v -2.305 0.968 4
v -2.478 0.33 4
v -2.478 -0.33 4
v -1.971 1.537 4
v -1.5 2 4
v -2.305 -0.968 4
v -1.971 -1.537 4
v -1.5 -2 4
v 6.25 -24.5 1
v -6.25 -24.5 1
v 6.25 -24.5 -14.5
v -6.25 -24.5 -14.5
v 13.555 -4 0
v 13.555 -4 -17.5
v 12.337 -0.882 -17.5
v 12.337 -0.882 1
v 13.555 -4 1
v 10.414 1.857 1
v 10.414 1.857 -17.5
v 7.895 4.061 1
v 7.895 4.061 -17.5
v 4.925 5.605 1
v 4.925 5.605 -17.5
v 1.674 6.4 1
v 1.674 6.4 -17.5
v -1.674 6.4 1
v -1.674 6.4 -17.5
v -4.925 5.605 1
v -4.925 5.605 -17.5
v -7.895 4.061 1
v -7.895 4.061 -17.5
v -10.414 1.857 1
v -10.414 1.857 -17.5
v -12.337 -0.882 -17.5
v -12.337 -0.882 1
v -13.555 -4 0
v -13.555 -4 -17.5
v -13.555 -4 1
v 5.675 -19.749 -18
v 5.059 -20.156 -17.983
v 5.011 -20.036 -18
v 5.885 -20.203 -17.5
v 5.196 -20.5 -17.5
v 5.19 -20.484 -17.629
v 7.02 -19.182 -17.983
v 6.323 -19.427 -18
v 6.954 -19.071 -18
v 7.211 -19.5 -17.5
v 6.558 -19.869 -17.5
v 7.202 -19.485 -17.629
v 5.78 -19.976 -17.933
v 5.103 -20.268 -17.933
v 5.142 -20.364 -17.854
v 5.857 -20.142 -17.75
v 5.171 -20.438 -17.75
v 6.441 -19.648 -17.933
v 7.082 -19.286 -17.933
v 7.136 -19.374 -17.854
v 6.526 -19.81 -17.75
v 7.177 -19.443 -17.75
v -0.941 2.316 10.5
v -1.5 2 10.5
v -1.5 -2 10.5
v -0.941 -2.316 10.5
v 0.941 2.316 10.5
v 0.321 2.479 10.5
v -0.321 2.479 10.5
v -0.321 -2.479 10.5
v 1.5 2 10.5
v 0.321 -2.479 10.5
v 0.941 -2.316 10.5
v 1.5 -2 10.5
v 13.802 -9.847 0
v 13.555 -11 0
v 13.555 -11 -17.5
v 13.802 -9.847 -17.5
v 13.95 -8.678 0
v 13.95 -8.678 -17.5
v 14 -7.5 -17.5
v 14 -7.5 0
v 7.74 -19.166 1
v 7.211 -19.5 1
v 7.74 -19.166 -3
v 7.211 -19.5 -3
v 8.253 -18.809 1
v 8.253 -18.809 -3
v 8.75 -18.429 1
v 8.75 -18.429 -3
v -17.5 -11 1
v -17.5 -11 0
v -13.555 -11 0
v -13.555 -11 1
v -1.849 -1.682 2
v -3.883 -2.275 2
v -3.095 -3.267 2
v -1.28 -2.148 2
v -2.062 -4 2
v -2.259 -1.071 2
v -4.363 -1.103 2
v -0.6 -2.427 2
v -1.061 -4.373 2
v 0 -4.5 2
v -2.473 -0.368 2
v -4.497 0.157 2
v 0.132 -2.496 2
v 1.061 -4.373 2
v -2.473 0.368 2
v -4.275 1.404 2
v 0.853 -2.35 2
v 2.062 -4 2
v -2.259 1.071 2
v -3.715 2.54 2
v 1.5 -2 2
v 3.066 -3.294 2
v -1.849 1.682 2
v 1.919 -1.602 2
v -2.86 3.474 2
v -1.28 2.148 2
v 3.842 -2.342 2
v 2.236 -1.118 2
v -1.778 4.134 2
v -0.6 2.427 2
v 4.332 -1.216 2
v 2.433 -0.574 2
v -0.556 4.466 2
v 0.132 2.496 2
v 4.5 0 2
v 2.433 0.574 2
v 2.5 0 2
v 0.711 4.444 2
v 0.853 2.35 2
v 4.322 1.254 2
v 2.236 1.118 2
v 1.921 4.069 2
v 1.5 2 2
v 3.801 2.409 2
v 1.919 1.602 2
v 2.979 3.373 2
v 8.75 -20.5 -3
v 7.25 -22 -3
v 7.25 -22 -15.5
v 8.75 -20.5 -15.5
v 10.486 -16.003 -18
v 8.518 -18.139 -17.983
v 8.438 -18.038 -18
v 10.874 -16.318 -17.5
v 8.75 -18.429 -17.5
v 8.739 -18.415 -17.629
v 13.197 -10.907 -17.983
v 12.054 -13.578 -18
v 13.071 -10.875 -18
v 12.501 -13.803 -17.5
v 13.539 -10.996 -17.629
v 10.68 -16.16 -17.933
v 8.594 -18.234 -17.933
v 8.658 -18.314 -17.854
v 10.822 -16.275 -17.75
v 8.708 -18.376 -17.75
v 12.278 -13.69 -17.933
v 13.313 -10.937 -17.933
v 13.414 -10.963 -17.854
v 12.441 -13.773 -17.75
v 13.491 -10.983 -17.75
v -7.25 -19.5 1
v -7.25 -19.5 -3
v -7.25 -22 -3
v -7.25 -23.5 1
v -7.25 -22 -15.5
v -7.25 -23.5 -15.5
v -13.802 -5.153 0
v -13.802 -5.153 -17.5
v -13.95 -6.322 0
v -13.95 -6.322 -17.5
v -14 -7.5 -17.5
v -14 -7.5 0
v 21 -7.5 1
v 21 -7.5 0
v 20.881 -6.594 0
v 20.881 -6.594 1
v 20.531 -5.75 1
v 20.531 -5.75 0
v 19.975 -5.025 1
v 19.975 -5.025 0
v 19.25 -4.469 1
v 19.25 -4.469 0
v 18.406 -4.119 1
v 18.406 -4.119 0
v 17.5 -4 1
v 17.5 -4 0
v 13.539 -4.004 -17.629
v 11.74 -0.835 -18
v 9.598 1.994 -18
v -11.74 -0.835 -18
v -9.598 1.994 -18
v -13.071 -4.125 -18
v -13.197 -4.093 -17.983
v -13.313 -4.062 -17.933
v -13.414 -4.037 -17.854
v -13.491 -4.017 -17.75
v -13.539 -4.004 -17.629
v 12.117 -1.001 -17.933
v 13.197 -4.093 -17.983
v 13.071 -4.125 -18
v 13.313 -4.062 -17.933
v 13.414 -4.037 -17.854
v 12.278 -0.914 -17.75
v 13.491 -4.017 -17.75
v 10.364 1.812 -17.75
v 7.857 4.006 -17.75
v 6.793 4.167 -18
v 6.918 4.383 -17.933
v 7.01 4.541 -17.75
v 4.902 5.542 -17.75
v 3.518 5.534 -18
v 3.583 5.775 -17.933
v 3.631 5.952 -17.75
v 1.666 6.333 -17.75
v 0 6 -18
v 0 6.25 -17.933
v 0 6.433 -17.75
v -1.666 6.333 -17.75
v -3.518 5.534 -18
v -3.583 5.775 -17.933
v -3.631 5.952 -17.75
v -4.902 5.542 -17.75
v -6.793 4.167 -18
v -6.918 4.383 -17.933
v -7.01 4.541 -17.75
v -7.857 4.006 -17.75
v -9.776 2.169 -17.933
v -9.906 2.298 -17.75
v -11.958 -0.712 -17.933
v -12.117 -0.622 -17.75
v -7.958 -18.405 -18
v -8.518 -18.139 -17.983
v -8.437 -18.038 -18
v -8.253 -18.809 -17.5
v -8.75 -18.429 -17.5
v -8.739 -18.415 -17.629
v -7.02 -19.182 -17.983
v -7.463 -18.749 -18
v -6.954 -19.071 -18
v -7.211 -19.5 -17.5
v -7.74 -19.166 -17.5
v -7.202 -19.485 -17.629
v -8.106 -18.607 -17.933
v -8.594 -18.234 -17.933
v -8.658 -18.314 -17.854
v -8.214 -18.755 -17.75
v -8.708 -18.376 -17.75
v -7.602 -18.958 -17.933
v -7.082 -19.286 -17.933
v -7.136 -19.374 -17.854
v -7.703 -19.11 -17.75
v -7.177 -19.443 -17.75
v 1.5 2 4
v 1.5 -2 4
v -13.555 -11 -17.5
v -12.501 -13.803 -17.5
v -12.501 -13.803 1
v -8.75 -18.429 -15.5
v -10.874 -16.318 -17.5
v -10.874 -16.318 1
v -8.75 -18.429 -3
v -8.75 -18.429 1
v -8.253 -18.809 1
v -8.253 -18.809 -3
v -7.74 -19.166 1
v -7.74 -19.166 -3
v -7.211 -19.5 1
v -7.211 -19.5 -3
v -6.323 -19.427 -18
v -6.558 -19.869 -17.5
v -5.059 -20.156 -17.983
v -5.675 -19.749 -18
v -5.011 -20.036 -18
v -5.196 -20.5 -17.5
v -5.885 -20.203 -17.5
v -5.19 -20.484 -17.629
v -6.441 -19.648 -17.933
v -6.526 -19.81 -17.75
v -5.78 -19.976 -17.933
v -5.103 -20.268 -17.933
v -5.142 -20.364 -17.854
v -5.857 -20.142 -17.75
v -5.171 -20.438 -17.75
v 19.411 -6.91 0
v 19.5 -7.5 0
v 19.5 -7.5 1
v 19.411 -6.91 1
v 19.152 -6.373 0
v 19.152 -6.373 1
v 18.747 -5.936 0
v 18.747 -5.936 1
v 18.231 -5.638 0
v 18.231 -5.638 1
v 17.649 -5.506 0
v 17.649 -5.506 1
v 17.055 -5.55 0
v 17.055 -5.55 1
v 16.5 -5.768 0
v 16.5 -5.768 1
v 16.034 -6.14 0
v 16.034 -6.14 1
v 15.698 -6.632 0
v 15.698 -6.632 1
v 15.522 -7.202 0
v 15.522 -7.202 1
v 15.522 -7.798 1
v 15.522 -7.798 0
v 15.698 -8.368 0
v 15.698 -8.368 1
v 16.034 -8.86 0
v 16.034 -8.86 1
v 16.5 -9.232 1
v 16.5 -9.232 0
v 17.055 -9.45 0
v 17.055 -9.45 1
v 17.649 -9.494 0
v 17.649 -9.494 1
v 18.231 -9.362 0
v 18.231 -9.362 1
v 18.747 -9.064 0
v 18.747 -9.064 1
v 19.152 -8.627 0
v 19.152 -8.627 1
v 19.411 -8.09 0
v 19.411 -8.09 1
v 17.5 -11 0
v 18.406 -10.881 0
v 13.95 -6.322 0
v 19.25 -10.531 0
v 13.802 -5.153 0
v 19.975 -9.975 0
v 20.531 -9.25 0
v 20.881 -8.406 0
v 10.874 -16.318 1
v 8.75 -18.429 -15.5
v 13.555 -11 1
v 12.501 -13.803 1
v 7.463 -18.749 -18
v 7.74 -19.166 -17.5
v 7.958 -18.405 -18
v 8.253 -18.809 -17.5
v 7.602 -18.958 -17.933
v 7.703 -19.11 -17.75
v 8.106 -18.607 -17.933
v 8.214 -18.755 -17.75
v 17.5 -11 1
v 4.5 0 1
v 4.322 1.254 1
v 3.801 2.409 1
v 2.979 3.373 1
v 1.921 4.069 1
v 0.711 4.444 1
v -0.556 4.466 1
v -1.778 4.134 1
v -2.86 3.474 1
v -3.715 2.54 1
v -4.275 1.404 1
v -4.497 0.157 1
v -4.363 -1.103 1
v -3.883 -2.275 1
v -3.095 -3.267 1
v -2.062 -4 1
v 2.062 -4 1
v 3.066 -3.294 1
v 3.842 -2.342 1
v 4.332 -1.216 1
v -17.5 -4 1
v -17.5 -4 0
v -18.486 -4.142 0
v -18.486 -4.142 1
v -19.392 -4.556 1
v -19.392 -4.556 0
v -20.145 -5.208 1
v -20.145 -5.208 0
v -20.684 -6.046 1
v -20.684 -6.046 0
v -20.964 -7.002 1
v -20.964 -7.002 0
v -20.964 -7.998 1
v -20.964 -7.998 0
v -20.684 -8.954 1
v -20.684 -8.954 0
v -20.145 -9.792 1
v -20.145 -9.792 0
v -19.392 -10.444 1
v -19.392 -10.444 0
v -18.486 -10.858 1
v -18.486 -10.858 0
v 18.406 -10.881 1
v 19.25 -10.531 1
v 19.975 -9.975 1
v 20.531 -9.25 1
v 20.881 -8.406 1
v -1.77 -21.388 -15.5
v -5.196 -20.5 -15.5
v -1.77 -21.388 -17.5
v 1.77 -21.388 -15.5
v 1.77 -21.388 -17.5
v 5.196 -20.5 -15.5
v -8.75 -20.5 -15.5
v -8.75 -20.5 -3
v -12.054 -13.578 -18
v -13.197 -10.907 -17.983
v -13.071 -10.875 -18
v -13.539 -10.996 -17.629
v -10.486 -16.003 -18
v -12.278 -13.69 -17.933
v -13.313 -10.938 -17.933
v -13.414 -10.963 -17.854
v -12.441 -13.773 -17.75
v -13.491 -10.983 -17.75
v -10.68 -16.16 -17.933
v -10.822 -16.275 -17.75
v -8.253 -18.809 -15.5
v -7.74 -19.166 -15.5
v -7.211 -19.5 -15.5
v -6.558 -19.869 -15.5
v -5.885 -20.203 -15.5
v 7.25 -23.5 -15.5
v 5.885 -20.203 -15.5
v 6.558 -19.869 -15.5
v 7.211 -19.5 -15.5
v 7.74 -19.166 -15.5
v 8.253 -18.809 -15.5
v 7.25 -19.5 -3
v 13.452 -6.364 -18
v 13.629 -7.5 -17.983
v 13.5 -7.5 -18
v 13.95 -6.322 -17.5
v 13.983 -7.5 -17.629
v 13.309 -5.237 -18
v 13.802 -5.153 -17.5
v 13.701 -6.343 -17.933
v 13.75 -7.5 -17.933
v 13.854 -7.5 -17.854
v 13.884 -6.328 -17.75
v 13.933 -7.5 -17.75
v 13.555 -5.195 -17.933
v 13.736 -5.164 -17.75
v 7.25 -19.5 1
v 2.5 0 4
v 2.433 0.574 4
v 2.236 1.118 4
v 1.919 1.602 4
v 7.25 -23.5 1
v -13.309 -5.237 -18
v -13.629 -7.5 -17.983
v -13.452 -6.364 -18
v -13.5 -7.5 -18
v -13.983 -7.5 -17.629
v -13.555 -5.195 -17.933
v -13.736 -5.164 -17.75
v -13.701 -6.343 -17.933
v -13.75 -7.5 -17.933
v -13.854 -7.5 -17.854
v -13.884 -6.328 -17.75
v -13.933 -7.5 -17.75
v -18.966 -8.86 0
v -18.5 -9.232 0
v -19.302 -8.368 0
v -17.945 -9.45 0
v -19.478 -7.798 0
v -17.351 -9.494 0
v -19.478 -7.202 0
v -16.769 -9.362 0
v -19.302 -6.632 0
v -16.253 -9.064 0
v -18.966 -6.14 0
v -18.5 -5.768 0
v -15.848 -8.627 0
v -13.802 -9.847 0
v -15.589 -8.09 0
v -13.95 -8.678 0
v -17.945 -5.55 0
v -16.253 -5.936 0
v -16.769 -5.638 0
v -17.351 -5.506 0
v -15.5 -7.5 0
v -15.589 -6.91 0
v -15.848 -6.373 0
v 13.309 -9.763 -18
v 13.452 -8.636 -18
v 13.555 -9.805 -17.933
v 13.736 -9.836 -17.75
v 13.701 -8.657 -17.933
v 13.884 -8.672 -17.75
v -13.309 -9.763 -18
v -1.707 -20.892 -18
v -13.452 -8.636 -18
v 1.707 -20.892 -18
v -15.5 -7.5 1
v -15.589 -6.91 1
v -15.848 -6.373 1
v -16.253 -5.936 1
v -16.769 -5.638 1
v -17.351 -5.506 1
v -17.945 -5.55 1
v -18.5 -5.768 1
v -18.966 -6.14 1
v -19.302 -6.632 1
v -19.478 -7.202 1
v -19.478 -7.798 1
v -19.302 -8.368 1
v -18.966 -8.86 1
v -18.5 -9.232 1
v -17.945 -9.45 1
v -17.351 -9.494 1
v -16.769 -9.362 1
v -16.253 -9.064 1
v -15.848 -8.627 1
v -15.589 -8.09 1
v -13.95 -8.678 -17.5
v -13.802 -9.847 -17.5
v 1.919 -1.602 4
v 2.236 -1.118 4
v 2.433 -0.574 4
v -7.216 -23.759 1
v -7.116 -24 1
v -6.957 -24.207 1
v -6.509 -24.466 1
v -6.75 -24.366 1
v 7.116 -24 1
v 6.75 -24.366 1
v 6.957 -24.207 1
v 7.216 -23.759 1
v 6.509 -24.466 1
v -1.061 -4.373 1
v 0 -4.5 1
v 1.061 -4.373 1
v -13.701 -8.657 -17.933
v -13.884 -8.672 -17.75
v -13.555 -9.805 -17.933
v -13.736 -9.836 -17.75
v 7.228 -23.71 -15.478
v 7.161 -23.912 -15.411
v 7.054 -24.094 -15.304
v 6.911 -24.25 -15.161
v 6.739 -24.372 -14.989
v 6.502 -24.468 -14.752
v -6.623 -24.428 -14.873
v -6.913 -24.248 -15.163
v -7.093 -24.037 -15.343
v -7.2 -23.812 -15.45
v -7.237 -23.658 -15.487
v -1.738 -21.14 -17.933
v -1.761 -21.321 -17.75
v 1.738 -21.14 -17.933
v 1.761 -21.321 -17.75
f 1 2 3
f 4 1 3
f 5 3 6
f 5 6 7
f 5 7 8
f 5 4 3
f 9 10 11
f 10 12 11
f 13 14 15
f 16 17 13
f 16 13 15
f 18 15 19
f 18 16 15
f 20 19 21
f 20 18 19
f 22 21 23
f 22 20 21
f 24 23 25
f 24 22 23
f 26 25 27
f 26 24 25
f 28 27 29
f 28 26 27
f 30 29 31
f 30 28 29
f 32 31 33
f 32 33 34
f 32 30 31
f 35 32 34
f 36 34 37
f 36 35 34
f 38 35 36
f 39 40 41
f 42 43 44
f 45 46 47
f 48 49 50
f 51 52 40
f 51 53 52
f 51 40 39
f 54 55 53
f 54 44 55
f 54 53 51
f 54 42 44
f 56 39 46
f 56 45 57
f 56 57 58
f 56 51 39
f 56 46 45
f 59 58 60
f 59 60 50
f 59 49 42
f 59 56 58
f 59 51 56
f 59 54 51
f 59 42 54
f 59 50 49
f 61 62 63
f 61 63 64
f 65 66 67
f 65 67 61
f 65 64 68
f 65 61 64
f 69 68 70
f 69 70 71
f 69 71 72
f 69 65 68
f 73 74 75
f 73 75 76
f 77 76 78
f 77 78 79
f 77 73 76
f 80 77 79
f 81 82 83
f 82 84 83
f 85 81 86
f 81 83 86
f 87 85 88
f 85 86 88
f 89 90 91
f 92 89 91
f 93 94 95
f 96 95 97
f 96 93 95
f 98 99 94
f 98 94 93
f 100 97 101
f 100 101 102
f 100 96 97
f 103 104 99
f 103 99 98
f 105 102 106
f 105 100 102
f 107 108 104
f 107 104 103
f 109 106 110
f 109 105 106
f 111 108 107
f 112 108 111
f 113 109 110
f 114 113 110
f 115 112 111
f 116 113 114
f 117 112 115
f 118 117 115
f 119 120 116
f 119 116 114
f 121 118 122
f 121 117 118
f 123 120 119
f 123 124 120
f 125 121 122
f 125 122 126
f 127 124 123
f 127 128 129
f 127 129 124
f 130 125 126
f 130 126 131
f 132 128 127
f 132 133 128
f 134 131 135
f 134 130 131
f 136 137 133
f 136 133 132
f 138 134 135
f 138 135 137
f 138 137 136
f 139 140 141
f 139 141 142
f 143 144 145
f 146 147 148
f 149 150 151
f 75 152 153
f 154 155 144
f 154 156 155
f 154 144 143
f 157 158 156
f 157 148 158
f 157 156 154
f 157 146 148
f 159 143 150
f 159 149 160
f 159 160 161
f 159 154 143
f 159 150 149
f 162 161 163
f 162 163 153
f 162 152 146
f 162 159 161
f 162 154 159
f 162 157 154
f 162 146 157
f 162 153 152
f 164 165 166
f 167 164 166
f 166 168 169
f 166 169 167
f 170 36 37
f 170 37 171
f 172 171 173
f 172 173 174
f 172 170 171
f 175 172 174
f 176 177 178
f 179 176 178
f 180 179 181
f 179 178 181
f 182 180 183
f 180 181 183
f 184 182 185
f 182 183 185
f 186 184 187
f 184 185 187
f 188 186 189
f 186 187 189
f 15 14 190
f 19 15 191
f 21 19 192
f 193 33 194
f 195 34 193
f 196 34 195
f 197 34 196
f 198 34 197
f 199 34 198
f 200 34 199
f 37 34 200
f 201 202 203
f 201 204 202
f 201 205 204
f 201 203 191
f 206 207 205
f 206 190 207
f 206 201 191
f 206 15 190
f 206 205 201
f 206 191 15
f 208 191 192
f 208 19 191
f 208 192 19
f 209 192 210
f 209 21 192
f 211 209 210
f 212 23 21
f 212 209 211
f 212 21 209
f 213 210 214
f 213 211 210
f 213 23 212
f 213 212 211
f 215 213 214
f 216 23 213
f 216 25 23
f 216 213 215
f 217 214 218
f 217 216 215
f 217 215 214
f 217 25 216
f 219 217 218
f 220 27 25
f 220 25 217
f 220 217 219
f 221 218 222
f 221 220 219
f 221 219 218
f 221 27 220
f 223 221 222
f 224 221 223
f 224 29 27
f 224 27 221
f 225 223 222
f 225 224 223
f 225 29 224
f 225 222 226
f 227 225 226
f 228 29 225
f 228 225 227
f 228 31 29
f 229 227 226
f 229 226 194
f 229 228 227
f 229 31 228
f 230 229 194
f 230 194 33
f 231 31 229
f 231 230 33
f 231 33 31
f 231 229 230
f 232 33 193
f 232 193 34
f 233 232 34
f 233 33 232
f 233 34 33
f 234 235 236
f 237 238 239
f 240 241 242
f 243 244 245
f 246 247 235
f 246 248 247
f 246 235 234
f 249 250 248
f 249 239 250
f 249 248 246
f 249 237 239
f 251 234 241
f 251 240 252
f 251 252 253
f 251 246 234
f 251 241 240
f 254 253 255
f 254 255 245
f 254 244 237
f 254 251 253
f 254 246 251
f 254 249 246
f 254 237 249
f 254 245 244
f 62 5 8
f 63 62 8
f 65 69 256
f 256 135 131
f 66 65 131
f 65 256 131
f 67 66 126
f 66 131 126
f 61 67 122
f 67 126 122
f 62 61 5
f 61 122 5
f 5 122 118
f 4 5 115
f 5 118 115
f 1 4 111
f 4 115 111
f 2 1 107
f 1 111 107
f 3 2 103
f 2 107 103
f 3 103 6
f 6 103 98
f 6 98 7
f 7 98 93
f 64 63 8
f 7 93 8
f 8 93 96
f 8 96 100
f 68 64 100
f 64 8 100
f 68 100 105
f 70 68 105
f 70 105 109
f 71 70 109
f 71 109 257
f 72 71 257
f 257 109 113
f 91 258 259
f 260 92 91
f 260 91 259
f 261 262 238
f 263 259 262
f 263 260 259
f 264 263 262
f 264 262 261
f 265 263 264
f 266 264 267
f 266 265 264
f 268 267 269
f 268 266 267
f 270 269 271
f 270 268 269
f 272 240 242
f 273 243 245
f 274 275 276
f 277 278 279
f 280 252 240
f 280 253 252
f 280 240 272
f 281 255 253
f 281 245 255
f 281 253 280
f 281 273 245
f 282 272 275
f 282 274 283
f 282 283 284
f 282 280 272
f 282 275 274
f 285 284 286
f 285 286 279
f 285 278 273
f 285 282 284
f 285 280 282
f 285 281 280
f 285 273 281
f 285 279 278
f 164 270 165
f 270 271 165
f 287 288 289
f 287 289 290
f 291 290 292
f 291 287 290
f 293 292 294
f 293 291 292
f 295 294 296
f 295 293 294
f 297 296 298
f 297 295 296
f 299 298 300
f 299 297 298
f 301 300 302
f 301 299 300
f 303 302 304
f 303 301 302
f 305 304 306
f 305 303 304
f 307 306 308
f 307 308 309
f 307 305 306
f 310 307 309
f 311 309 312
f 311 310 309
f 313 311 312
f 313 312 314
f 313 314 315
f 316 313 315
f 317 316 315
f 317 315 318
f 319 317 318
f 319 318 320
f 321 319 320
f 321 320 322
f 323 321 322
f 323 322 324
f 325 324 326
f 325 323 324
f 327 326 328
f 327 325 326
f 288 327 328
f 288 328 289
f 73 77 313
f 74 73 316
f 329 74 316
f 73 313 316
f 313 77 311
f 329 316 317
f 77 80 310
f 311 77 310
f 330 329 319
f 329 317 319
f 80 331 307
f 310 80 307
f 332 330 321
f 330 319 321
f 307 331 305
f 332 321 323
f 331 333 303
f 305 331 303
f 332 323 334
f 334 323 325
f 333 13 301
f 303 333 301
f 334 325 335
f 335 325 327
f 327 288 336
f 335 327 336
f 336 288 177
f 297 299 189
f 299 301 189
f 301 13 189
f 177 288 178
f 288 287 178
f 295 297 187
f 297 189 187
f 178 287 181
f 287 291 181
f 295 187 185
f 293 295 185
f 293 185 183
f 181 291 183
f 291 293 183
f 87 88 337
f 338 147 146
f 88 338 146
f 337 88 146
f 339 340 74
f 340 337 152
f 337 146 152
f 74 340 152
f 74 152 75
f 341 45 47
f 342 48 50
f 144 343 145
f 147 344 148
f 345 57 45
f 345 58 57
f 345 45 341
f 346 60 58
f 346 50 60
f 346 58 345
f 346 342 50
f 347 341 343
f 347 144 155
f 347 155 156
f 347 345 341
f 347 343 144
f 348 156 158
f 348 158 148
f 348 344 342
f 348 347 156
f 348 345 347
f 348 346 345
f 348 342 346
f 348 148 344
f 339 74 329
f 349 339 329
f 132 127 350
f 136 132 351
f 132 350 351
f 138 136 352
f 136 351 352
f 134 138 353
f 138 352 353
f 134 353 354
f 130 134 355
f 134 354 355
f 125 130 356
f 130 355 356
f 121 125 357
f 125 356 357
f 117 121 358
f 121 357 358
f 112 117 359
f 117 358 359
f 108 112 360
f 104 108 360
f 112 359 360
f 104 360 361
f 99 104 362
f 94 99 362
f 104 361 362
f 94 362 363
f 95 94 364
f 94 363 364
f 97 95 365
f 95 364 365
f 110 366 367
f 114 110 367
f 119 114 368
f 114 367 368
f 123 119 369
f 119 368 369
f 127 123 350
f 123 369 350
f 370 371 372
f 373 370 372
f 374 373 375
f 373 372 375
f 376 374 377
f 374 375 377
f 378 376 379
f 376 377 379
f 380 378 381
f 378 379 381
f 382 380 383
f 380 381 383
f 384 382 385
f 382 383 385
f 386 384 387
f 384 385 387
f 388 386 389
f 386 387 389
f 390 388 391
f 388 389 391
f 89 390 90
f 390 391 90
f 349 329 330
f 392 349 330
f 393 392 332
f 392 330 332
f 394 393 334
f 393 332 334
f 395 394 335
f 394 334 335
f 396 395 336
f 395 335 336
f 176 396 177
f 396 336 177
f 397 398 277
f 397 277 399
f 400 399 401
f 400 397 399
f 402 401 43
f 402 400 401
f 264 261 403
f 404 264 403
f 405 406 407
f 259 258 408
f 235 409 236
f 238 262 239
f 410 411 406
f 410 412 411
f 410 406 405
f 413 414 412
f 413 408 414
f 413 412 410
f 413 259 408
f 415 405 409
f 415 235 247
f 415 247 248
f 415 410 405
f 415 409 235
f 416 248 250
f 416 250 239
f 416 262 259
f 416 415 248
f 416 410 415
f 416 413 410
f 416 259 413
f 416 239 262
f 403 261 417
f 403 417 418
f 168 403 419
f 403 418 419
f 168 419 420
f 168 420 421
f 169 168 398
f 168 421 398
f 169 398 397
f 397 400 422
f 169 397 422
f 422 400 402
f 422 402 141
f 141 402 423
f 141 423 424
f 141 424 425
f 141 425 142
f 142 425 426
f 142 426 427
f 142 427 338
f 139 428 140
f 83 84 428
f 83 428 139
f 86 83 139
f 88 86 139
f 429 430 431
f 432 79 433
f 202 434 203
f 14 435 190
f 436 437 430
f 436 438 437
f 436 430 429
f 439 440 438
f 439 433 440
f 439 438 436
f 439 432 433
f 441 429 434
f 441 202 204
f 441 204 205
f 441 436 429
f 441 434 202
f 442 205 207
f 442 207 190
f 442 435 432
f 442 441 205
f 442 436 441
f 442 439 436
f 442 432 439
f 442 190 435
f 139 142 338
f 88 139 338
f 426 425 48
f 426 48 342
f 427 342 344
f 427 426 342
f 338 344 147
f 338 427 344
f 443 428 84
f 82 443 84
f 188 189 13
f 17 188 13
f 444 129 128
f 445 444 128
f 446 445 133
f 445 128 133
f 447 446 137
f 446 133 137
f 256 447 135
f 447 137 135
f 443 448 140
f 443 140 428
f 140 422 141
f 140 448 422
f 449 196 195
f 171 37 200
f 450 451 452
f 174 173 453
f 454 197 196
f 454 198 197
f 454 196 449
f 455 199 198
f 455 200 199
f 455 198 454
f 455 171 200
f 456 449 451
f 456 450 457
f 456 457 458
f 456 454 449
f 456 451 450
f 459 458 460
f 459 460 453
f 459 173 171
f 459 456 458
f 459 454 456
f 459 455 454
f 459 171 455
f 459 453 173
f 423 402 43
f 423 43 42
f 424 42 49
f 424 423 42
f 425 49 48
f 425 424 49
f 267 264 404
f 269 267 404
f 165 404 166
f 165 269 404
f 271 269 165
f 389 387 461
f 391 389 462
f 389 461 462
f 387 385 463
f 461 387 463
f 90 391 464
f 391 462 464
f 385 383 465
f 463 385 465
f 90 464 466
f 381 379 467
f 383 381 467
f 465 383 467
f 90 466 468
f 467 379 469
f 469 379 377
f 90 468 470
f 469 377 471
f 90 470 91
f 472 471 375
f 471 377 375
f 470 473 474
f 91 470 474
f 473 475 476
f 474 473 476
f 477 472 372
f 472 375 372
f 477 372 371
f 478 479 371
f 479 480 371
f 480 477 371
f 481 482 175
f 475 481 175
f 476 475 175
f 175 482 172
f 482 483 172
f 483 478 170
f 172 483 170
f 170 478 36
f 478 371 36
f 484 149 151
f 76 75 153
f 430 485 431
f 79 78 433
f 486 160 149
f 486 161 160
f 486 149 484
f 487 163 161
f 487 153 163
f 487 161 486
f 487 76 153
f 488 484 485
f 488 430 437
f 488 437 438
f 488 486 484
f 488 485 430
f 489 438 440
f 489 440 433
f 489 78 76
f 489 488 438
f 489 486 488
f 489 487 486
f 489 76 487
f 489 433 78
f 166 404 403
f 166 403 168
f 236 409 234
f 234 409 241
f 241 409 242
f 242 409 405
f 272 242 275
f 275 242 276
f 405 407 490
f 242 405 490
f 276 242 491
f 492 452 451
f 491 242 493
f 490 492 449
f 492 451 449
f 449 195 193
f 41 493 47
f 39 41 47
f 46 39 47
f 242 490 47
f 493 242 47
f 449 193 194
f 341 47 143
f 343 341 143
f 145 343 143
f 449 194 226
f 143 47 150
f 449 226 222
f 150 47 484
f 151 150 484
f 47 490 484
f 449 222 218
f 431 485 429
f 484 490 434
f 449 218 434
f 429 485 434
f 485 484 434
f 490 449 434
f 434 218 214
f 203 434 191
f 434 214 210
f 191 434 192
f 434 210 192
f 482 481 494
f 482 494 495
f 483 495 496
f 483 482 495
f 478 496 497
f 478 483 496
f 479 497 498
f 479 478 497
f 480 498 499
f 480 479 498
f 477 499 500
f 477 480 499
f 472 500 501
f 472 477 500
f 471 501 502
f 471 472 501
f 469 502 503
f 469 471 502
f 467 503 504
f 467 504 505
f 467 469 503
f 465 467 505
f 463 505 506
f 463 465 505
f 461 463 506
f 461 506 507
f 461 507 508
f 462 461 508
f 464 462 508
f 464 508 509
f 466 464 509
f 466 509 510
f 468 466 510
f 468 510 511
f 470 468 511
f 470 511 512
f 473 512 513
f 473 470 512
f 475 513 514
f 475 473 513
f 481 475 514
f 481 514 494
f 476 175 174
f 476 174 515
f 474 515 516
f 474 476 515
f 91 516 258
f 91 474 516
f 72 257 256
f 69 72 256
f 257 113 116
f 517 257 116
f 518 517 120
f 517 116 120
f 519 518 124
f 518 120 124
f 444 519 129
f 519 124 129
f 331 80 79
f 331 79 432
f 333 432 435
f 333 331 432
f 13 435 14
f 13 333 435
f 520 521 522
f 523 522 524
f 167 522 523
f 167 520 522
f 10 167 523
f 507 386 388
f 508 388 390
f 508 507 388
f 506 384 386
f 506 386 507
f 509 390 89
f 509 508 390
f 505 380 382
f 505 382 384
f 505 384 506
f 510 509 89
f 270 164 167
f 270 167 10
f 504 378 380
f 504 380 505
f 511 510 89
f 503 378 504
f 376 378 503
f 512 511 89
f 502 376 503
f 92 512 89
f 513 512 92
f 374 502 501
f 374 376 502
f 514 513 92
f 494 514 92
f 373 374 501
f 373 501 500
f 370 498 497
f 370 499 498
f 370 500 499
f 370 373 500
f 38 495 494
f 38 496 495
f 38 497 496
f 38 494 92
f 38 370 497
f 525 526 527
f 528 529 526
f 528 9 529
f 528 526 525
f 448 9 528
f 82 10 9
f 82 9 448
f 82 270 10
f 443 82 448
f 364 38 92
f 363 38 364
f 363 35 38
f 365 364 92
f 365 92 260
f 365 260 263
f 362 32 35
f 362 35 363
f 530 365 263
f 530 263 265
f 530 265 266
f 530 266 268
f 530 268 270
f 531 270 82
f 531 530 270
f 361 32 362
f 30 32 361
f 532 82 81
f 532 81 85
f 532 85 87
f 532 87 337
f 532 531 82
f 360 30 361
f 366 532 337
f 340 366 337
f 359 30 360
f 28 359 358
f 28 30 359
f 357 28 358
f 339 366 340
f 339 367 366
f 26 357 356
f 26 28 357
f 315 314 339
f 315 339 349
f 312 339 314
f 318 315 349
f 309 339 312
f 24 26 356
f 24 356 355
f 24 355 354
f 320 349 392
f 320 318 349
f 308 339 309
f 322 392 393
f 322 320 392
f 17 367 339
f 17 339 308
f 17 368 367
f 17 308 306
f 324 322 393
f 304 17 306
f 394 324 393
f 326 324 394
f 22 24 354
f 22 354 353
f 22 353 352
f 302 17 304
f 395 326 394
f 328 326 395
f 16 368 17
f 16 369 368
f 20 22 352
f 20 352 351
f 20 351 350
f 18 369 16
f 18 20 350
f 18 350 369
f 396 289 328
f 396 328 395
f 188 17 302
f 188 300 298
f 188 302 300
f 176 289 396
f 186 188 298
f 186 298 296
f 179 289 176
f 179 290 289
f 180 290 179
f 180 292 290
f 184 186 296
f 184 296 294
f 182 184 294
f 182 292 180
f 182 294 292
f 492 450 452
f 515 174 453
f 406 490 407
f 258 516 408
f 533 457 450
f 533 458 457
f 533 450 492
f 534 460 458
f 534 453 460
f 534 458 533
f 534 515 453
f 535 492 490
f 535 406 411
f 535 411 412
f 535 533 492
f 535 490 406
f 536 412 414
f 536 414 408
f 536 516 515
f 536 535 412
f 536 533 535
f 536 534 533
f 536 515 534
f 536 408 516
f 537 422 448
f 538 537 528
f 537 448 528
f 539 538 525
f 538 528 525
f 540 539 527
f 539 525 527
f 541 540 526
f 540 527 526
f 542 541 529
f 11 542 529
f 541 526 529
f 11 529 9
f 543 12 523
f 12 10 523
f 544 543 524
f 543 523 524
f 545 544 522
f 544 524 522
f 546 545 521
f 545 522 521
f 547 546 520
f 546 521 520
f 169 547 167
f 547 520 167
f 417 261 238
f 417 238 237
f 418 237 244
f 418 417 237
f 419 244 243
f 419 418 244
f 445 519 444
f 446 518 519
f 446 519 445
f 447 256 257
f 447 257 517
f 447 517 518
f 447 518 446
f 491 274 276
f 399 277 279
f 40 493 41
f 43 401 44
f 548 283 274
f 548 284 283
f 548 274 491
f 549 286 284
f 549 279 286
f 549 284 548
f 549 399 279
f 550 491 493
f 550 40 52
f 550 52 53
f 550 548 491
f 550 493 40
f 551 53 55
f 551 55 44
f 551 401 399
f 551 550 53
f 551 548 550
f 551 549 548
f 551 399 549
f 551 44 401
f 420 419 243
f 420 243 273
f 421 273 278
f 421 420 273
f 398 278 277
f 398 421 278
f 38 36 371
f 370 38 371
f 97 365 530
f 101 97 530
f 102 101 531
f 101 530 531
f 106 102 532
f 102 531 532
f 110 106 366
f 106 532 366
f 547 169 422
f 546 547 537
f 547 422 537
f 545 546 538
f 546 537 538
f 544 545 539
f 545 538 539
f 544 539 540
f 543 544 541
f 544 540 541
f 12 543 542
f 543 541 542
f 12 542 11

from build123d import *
from build123d import SkipClean  # not in build123d's __all__

# Parameters (mm, degrees)
F0_R          = 2
F1_DEPTH      = 1
F2_DEPTH      = 18
F3_DEPTH      = 15.5
F3_DEPTH_BACK = 1
F4_START      = -3
F4_DEPTH      = 12.5
F5_DEPTH      = 2
F6_DEPTH      = 4
F7_DEPTH      = 10.5
F8_R          = 0.5
F9_R          = 1


with BuildPart() as f1:
    # F0 (on Top) → F1 (new body)
    with BuildSketch(Plane.XY):
        with BuildLine():
            ThreePointArc((2.0615528128, -4), (0, -4.5), (-2.0615528128, -4))
            Line((-2.0615528128, -4), (-13.5554417117, -4))
            ThreePointArc((-13.5554417117, -4), (-13.8884157477, -5.7359399052), (-14, -7.5))
            ThreePointArc((-14, -7.5), (-13.8884157477, -9.2640600948), (-13.5554417117, -11))
            Line((-13.5554417117, -11), (13.5554417117, -11))
            ThreePointArc((13.5554417117, -11), (13.8884157477, -9.2640600948), (14, -7.5))
            ThreePointArc((14, -7.5), (13.8884157477, -5.7359399052), (13.5554417117, -4))
            Line((13.5554417117, -4), (2.0615528128, -4))
        make_face()
        with BuildLine():
            ThreePointArc((17.5, -4), (15.0251262658, -5.0251262658), (14, -7.5))
            ThreePointArc((14, -7.5), (15.0251262658, -9.9748737342), (17.5, -11))
            ThreePointArc((17.5, -11), (19.9748737342, -9.9748737342), (21, -7.5))
            ThreePointArc((21, -7.5), (19.9748737342, -5.0251262658), (17.5, -4))
        make_face()
        with Locations((17.5, -7.5)):
            Circle(F0_R, mode=Mode.SUBTRACT)
        with BuildLine():
            ThreePointArc((-17.5, -11), (-15.0251262658, -9.9748737342), (-14, -7.5))
            ThreePointArc((-14, -7.5), (-15.0251262658, -5.0251262658), (-17.5, -4))
            ThreePointArc((-17.5, -4), (-21, -7.5), (-17.5, -11))
        make_face()
        with Locations((-17.5, -7.5)):
            Circle(F0_R, mode=Mode.SUBTRACT)
        with BuildLine():
            ThreePointArc((-14, -7.5), (-13.8884157477, -5.7359399052), (-13.5554417117, -4))
            Line((-13.5554417117, -4), (-17.5, -4))
            ThreePointArc((-17.5, -4), (-15.0251262658, -5.0251262658), (-14, -7.5))
        make_face()
        with BuildLine():
            ThreePointArc((-13.5554417117, -11), (-13.8884157477, -9.2640600948), (-14, -7.5))
            ThreePointArc((-14, -7.5), (-15.0251262658, -9.9748737342), (-17.5, -11))
            Line((-17.5, -11), (-13.5554417117, -11))
        make_face()
        with BuildLine():
            Line((13.5554417117, -11), (-13.5554417117, -11))
            ThreePointArc((-13.5554417117, -11), (-11.7549883504, -15.1039627091), (-8.75, -18.4287464972))
            Line((-8.75, -18.4287464972), (-8.75, -12.5))
            Line((-8.75, -12.5), (8.75, -12.5))
            Line((8.75, -12.5), (8.75, -18.4287464972))
            ThreePointArc((8.75, -18.4287464972), (11.7549883504, -15.1039627091), (13.5554417117, -11))
        make_face()
        with BuildLine():
            Line((-8.75, -12.5), (-8.75, -18.4287464972))
            ThreePointArc((-8.75, -18.4287464972), (-7.9985057778, -18.9901655916), (-7.2111025509, -19.5))
            Line((-7.2111025509, -19.5), (7.2111025509, -19.5))
            ThreePointArc((7.2111025509, -19.5), (7.9985057778, -18.9901655916), (8.75, -18.4287464972))
            Line((8.75, -18.4287464972), (8.75, -12.5))
            Line((8.75, -12.5), (-8.75, -12.5))
        make_face()
        with BuildLine():
            ThreePointArc((-2.0615528128, -4), (-2.3423292192, 3.8423292192), (4.5, 0))
            ThreePointArc((4.5, 0), (3.8423292192, -2.3423292192), (2.0615528128, -4))
            Line((2.0615528128, -4), (13.5554417117, -4))
            ThreePointArc((13.5554417117, -4), (0, 6.5), (-13.5554417117, -4))
            Line((-13.5554417117, -4), (-2.0615528128, -4))
        make_face()
        with BuildLine():
            Line((17.5, -4), (13.5554417117, -4))
            ThreePointArc((13.5554417117, -4), (13.8884157477, -5.7359399052), (14, -7.5))
            ThreePointArc((14, -7.5), (15.0251262658, -5.0251262658), (17.5, -4))
        make_face()
        with BuildLine():
            ThreePointArc((17.5, -11), (15.0251262658, -9.9748737342), (14, -7.5))
            ThreePointArc((14, -7.5), (13.8884157477, -9.2640600948), (13.5554417117, -11))
            Line((13.5554417117, -11), (17.5, -11))
        make_face()
    extrude(amount=F1_DEPTH)

    # F0 (on Top) → F2 (join)
    with BuildSketch(Plane.XY):
        with BuildLine():
            ThreePointArc((-2.0615528128, -4), (-2.3423292192, 3.8423292192), (4.5, 0))
            ThreePointArc((4.5, 0), (3.8423292192, -2.3423292192), (2.0615528128, -4))
            Line((2.0615528128, -4), (13.5554417117, -4))
            ThreePointArc((13.5554417117, -4), (0, 6.5), (-13.5554417117, -4))
            Line((-13.5554417117, -4), (-2.0615528128, -4))
        make_face()
        with BuildLine():
            ThreePointArc((2.0615528128, -4), (0, -4.5), (-2.0615528128, -4))
            Line((-2.0615528128, -4), (-13.5554417117, -4))
            ThreePointArc((-13.5554417117, -4), (-13.8884157477, -5.7359399052), (-14, -7.5))
            ThreePointArc((-14, -7.5), (-13.8884157477, -9.2640600948), (-13.5554417117, -11))
            Line((-13.5554417117, -11), (13.5554417117, -11))
            ThreePointArc((13.5554417117, -11), (13.8884157477, -9.2640600948), (14, -7.5))
            ThreePointArc((14, -7.5), (13.8884157477, -5.7359399052), (13.5554417117, -4))
            Line((13.5554417117, -4), (2.0615528128, -4))
        make_face()
        with BuildLine():
            Line((13.5554417117, -11), (-13.5554417117, -11))
            ThreePointArc((-13.5554417117, -11), (-11.7549883504, -15.1039627091), (-8.75, -18.4287464972))
            Line((-8.75, -18.4287464972), (-8.75, -12.5))
            Line((-8.75, -12.5), (8.75, -12.5))
            Line((8.75, -12.5), (8.75, -18.4287464972))
            ThreePointArc((8.75, -18.4287464972), (11.7549883504, -15.1039627091), (13.5554417117, -11))
        make_face()
        with BuildLine():
            Line((-8.75, -12.5), (-8.75, -18.4287464972))
            ThreePointArc((-8.75, -18.4287464972), (-7.9985057778, -18.9901655916), (-7.2111025509, -19.5))
            Line((-7.2111025509, -19.5), (7.2111025509, -19.5))
            ThreePointArc((7.2111025509, -19.5), (7.9985057778, -18.9901655916), (8.75, -18.4287464972))
            Line((8.75, -18.4287464972), (8.75, -12.5))
            Line((8.75, -12.5), (-8.75, -12.5))
        make_face()
        with BuildLine():
            Line((5.1961524227, -20.5), (-5.1961524227, -20.5))
            ThreePointArc((-5.1961524227, -20.5), (0, -21.5), (5.1961524227, -20.5))
        make_face()
        with BuildLine():
            Line((7.2111025509, -19.5), (-7.2111025509, -19.5))
            ThreePointArc((-7.2111025509, -19.5), (-6.223744371, -20.0405345183), (-5.1961524227, -20.5))
            Line((-5.1961524227, -20.5), (5.1961524227, -20.5))
            ThreePointArc((5.1961524227, -20.5), (6.223744371, -20.0405345183), (7.2111025509, -19.5))
        make_face()
        with BuildLine():
            ThreePointArc((2.0615528128, -4), (3.8423292192, -2.3423292192), (4.5, 0))
            ThreePointArc((4.5, 0), (-2.3423292192, 3.8423292192), (-2.0615528128, -4))
            Line((-2.0615528128, -4), (2.0615528128, -4))
        make_face()
        with BuildLine():
            ThreePointArc((1.5, 2), (2.2360679775, 1.1180339887), (2.5, 0))
            ThreePointArc((2.5, 0), (2.2360679775, -1.1180339887), (1.5, -2))
            Line((1.5, -2), (1.5, -3.1181974337))
            Line((1.5, -3.1181974337), (-1.5, -3.1181974337))
            Line((-1.5, -3.1181974337), (-1.5, -2))
            ThreePointArc((-1.5, -2), (-2.5, 0), (-1.5, 2))
            Line((-1.5, 2), (-1.5, 2.8818025663))
            Line((-1.5, 2.8818025663), (1.5, 2.8818025663))
            Line((1.5, 2.8818025663), (1.5, 2))
        make_face(mode=Mode.SUBTRACT)
        with BuildLine():
            Line((2.0615528128, -4), (-2.0615528128, -4))
            ThreePointArc((-2.0615528128, -4), (0, -4.5), (2.0615528128, -4))
        make_face()
        with BuildLine():
            ThreePointArc((-1.5, 2), (0, 2.5), (1.5, 2))
            Line((1.5, 2), (1.5, 2.8818025663))
            Line((1.5, 2.8818025663), (-1.5, 2.8818025663))
            Line((-1.5, 2.8818025663), (-1.5, 2))
        make_face()
        with BuildLine():
            Line((1.5, -2), (1.5, 2))
            ThreePointArc((1.5, 2), (0, 2.5), (-1.5, 2))
            Line((-1.5, 2), (-1.5, -2))
            ThreePointArc((-1.5, -2), (0, -2.5), (1.5, -2))
        make_face()
        with BuildLine():
            ThreePointArc((1.5, -2), (2.2360679775, -1.1180339887), (2.5, 0))
            ThreePointArc((2.5, 0), (2.2360679775, 1.1180339887), (1.5, 2))
            Line((1.5, 2), (1.5, -2))
        make_face()
        with BuildLine():
            Line((1.5, -3.1181974337), (1.5, -2))
            ThreePointArc((1.5, -2), (0, -2.5), (-1.5, -2))
            Line((-1.5, -2), (-1.5, -3.1181974337))
            Line((-1.5, -3.1181974337), (1.5, -3.1181974337))
        make_face()
        with BuildLine():
            Line((-1.5, -2), (-1.5, 2))
            ThreePointArc((-1.5, 2), (-2.5, 0), (-1.5, -2))
        make_face()
    with SkipClean():  # cleaning this boolean's faces spoils the solid; the shape is the same uncleaned
        extrude(amount=-F2_DEPTH)

    # F0 (on Top) → F3 (join, two sides)
    with BuildSketch(Plane.XY) as f3_sk:
        with BuildLine():
            ThreePointArc((5.1961524227, -20.5), (0, -21.5), (-5.1961524227, -20.5))
            Line((-5.1961524227, -20.5), (-7.25, -20.5))
            Line((-7.25, -20.5), (-7.25, -22))
            Line((-7.25, -22), (-7.25, -24.5))
            Line((-7.25, -24.5), (7.25, -24.5))
            Line((7.25, -24.5), (7.25, -22))
            Line((7.25, -22), (7.25, -20.5))
            Line((7.25, -20.5), (5.1961524227, -20.5))
        make_face()
        with BuildLine():
            ThreePointArc((-5.1961524227, -20.5), (-6.223744371, -20.0405345183), (-7.2111025509, -19.5))
            Line((-7.2111025509, -19.5), (-7.25, -19.5))
            Line((-7.25, -19.5), (-7.25, -20.5))
            Line((-7.25, -20.5), (-5.1961524227, -20.5))
        make_face()
        with BuildLine():
            Line((5.1961524227, -20.5), (-5.1961524227, -20.5))
            ThreePointArc((-5.1961524227, -20.5), (0, -21.5), (5.1961524227, -20.5))
        make_face()
        with BuildLine():
            Line((7.2111025509, -19.5), (-7.2111025509, -19.5))
            ThreePointArc((-7.2111025509, -19.5), (-6.223744371, -20.0405345183), (-5.1961524227, -20.5))
            Line((-5.1961524227, -20.5), (5.1961524227, -20.5))
            ThreePointArc((5.1961524227, -20.5), (6.223744371, -20.0405345183), (7.2111025509, -19.5))
        make_face()
        with BuildLine():
            Line((7.25, -19.5), (7.2111025509, -19.5))
            ThreePointArc((7.2111025509, -19.5), (6.223744371, -20.0405345183), (5.1961524227, -20.5))
            Line((5.1961524227, -20.5), (7.25, -20.5))
            Line((7.25, -20.5), (7.25, -19.5))
        make_face()
    extrude(amount=-F3_DEPTH)
    extrude(f3_sk.sketch, amount=F3_DEPTH_BACK)

    # F0 (on Top) → F4 (join)
    with BuildSketch(Plane.XY.offset(F4_START)):
        with BuildLine():
            Line((8.75, -20.5), (8.75, -18.4287464972))
            ThreePointArc((8.75, -18.4287464972), (7.9985057778, -18.9901655916), (7.2111025509, -19.5))
            Line((7.2111025509, -19.5), (7.25, -19.5))
            Line((7.25, -19.5), (7.25, -20.5))
            Line((7.25, -20.5), (8.75, -20.5))
        make_face()
        Polygon((7.25, -22), (8.75, -20.5), (7.25, -20.5), align=None)
        with BuildLine():
            ThreePointArc((-7.2111025509, -19.5), (-7.9985057778, -18.9901655916), (-8.75, -18.4287464972))
            Line((-8.75, -18.4287464972), (-8.75, -20.5))
            Line((-8.75, -20.5), (-7.25, -20.5))
            Line((-7.25, -20.5), (-7.25, -19.5))
            Line((-7.25, -19.5), (-7.2111025509, -19.5))
        make_face()
        Polygon((-7.25, -20.5), (-8.75, -20.5), (-7.25, -22), align=None)
    extrude(amount=-F4_DEPTH)

    # F0 (on Top) → F5 (join)
    with BuildSketch(Plane.XY):
        with BuildLine():
            ThreePointArc((2.0615528128, -4), (3.8423292192, -2.3423292192), (4.5, 0))
            ThreePointArc((4.5, 0), (-2.3423292192, 3.8423292192), (-2.0615528128, -4))
            Line((-2.0615528128, -4), (2.0615528128, -4))
        make_face()
        with BuildLine():
            ThreePointArc((1.5, 2), (2.2360679775, 1.1180339887), (2.5, 0))
            ThreePointArc((2.5, 0), (2.2360679775, -1.1180339887), (1.5, -2))
            Line((1.5, -2), (1.5, -3.1181974337))
            Line((1.5, -3.1181974337), (-1.5, -3.1181974337))
            Line((-1.5, -3.1181974337), (-1.5, -2))
            ThreePointArc((-1.5, -2), (-2.5, 0), (-1.5, 2))
            Line((-1.5, 2), (-1.5, 2.8818025663))
            Line((-1.5, 2.8818025663), (1.5, 2.8818025663))
            Line((1.5, 2.8818025663), (1.5, 2))
        make_face(mode=Mode.SUBTRACT)
        with BuildLine():
            ThreePointArc((-1.5, 2), (0, 2.5), (1.5, 2))
            Line((1.5, 2), (1.5, 2.8818025663))
            Line((1.5, 2.8818025663), (-1.5, 2.8818025663))
            Line((-1.5, 2.8818025663), (-1.5, 2))
        make_face()
        with BuildLine():
            Line((1.5, -3.1181974337), (1.5, -2))
            ThreePointArc((1.5, -2), (0, -2.5), (-1.5, -2))
            Line((-1.5, -2), (-1.5, -3.1181974337))
            Line((-1.5, -3.1181974337), (1.5, -3.1181974337))
        make_face()
        with BuildLine():
            Line((2.0615528128, -4), (-2.0615528128, -4))
            ThreePointArc((-2.0615528128, -4), (0, -4.5), (2.0615528128, -4))
        make_face()
    extrude(amount=F5_DEPTH)

    # F0 (on Top) → F6 (join)
    with BuildSketch(Plane.XY):
        with BuildLine():
            ThreePointArc((1.5, -2), (2.2360679775, -1.1180339887), (2.5, 0))
            ThreePointArc((2.5, 0), (2.2360679775, 1.1180339887), (1.5, 2))
            Line((1.5, 2), (1.5, -2))
        make_face()
        with BuildLine():
            Line((1.5, -2), (1.5, 2))
            ThreePointArc((1.5, 2), (0, 2.5), (-1.5, 2))
            Line((-1.5, 2), (-1.5, -2))
            ThreePointArc((-1.5, -2), (0, -2.5), (1.5, -2))
        make_face()
        with BuildLine():
            Line((-1.5, -2), (-1.5, 2))
            ThreePointArc((-1.5, 2), (-2.5, 0), (-1.5, -2))
        make_face()
    extrude(amount=F6_DEPTH)

    # F0 (on Top) → F7 (join)
    with BuildSketch(Plane.XY):
        with BuildLine():
            Line((1.5, -2), (1.5, 2))
            ThreePointArc((1.5, 2), (0, 2.5), (-1.5, 2))
            Line((-1.5, 2), (-1.5, -2))
            ThreePointArc((-1.5, -2), (0, -2.5), (1.5, -2))
        make_face()
    extrude(amount=F7_DEPTH)

    # F8
    f8_edges = [f1.edges().sort_by_distance(p)[0] for p in [
        (7.211103, 4.5, -18),
    ]]
    fillet(f8_edges, radius=F8_R)

    # F9
    f9_edges = [f1.edges().sort_by_distance(p)[0] for p in [
        (-7.25, -24.5, -7.25),
        (0, -24.5, -15.5),
        (7.25, -24.5, -7.25),
    ]]
    fillet(f9_edges, radius=F9_R)


solid = f1.part
